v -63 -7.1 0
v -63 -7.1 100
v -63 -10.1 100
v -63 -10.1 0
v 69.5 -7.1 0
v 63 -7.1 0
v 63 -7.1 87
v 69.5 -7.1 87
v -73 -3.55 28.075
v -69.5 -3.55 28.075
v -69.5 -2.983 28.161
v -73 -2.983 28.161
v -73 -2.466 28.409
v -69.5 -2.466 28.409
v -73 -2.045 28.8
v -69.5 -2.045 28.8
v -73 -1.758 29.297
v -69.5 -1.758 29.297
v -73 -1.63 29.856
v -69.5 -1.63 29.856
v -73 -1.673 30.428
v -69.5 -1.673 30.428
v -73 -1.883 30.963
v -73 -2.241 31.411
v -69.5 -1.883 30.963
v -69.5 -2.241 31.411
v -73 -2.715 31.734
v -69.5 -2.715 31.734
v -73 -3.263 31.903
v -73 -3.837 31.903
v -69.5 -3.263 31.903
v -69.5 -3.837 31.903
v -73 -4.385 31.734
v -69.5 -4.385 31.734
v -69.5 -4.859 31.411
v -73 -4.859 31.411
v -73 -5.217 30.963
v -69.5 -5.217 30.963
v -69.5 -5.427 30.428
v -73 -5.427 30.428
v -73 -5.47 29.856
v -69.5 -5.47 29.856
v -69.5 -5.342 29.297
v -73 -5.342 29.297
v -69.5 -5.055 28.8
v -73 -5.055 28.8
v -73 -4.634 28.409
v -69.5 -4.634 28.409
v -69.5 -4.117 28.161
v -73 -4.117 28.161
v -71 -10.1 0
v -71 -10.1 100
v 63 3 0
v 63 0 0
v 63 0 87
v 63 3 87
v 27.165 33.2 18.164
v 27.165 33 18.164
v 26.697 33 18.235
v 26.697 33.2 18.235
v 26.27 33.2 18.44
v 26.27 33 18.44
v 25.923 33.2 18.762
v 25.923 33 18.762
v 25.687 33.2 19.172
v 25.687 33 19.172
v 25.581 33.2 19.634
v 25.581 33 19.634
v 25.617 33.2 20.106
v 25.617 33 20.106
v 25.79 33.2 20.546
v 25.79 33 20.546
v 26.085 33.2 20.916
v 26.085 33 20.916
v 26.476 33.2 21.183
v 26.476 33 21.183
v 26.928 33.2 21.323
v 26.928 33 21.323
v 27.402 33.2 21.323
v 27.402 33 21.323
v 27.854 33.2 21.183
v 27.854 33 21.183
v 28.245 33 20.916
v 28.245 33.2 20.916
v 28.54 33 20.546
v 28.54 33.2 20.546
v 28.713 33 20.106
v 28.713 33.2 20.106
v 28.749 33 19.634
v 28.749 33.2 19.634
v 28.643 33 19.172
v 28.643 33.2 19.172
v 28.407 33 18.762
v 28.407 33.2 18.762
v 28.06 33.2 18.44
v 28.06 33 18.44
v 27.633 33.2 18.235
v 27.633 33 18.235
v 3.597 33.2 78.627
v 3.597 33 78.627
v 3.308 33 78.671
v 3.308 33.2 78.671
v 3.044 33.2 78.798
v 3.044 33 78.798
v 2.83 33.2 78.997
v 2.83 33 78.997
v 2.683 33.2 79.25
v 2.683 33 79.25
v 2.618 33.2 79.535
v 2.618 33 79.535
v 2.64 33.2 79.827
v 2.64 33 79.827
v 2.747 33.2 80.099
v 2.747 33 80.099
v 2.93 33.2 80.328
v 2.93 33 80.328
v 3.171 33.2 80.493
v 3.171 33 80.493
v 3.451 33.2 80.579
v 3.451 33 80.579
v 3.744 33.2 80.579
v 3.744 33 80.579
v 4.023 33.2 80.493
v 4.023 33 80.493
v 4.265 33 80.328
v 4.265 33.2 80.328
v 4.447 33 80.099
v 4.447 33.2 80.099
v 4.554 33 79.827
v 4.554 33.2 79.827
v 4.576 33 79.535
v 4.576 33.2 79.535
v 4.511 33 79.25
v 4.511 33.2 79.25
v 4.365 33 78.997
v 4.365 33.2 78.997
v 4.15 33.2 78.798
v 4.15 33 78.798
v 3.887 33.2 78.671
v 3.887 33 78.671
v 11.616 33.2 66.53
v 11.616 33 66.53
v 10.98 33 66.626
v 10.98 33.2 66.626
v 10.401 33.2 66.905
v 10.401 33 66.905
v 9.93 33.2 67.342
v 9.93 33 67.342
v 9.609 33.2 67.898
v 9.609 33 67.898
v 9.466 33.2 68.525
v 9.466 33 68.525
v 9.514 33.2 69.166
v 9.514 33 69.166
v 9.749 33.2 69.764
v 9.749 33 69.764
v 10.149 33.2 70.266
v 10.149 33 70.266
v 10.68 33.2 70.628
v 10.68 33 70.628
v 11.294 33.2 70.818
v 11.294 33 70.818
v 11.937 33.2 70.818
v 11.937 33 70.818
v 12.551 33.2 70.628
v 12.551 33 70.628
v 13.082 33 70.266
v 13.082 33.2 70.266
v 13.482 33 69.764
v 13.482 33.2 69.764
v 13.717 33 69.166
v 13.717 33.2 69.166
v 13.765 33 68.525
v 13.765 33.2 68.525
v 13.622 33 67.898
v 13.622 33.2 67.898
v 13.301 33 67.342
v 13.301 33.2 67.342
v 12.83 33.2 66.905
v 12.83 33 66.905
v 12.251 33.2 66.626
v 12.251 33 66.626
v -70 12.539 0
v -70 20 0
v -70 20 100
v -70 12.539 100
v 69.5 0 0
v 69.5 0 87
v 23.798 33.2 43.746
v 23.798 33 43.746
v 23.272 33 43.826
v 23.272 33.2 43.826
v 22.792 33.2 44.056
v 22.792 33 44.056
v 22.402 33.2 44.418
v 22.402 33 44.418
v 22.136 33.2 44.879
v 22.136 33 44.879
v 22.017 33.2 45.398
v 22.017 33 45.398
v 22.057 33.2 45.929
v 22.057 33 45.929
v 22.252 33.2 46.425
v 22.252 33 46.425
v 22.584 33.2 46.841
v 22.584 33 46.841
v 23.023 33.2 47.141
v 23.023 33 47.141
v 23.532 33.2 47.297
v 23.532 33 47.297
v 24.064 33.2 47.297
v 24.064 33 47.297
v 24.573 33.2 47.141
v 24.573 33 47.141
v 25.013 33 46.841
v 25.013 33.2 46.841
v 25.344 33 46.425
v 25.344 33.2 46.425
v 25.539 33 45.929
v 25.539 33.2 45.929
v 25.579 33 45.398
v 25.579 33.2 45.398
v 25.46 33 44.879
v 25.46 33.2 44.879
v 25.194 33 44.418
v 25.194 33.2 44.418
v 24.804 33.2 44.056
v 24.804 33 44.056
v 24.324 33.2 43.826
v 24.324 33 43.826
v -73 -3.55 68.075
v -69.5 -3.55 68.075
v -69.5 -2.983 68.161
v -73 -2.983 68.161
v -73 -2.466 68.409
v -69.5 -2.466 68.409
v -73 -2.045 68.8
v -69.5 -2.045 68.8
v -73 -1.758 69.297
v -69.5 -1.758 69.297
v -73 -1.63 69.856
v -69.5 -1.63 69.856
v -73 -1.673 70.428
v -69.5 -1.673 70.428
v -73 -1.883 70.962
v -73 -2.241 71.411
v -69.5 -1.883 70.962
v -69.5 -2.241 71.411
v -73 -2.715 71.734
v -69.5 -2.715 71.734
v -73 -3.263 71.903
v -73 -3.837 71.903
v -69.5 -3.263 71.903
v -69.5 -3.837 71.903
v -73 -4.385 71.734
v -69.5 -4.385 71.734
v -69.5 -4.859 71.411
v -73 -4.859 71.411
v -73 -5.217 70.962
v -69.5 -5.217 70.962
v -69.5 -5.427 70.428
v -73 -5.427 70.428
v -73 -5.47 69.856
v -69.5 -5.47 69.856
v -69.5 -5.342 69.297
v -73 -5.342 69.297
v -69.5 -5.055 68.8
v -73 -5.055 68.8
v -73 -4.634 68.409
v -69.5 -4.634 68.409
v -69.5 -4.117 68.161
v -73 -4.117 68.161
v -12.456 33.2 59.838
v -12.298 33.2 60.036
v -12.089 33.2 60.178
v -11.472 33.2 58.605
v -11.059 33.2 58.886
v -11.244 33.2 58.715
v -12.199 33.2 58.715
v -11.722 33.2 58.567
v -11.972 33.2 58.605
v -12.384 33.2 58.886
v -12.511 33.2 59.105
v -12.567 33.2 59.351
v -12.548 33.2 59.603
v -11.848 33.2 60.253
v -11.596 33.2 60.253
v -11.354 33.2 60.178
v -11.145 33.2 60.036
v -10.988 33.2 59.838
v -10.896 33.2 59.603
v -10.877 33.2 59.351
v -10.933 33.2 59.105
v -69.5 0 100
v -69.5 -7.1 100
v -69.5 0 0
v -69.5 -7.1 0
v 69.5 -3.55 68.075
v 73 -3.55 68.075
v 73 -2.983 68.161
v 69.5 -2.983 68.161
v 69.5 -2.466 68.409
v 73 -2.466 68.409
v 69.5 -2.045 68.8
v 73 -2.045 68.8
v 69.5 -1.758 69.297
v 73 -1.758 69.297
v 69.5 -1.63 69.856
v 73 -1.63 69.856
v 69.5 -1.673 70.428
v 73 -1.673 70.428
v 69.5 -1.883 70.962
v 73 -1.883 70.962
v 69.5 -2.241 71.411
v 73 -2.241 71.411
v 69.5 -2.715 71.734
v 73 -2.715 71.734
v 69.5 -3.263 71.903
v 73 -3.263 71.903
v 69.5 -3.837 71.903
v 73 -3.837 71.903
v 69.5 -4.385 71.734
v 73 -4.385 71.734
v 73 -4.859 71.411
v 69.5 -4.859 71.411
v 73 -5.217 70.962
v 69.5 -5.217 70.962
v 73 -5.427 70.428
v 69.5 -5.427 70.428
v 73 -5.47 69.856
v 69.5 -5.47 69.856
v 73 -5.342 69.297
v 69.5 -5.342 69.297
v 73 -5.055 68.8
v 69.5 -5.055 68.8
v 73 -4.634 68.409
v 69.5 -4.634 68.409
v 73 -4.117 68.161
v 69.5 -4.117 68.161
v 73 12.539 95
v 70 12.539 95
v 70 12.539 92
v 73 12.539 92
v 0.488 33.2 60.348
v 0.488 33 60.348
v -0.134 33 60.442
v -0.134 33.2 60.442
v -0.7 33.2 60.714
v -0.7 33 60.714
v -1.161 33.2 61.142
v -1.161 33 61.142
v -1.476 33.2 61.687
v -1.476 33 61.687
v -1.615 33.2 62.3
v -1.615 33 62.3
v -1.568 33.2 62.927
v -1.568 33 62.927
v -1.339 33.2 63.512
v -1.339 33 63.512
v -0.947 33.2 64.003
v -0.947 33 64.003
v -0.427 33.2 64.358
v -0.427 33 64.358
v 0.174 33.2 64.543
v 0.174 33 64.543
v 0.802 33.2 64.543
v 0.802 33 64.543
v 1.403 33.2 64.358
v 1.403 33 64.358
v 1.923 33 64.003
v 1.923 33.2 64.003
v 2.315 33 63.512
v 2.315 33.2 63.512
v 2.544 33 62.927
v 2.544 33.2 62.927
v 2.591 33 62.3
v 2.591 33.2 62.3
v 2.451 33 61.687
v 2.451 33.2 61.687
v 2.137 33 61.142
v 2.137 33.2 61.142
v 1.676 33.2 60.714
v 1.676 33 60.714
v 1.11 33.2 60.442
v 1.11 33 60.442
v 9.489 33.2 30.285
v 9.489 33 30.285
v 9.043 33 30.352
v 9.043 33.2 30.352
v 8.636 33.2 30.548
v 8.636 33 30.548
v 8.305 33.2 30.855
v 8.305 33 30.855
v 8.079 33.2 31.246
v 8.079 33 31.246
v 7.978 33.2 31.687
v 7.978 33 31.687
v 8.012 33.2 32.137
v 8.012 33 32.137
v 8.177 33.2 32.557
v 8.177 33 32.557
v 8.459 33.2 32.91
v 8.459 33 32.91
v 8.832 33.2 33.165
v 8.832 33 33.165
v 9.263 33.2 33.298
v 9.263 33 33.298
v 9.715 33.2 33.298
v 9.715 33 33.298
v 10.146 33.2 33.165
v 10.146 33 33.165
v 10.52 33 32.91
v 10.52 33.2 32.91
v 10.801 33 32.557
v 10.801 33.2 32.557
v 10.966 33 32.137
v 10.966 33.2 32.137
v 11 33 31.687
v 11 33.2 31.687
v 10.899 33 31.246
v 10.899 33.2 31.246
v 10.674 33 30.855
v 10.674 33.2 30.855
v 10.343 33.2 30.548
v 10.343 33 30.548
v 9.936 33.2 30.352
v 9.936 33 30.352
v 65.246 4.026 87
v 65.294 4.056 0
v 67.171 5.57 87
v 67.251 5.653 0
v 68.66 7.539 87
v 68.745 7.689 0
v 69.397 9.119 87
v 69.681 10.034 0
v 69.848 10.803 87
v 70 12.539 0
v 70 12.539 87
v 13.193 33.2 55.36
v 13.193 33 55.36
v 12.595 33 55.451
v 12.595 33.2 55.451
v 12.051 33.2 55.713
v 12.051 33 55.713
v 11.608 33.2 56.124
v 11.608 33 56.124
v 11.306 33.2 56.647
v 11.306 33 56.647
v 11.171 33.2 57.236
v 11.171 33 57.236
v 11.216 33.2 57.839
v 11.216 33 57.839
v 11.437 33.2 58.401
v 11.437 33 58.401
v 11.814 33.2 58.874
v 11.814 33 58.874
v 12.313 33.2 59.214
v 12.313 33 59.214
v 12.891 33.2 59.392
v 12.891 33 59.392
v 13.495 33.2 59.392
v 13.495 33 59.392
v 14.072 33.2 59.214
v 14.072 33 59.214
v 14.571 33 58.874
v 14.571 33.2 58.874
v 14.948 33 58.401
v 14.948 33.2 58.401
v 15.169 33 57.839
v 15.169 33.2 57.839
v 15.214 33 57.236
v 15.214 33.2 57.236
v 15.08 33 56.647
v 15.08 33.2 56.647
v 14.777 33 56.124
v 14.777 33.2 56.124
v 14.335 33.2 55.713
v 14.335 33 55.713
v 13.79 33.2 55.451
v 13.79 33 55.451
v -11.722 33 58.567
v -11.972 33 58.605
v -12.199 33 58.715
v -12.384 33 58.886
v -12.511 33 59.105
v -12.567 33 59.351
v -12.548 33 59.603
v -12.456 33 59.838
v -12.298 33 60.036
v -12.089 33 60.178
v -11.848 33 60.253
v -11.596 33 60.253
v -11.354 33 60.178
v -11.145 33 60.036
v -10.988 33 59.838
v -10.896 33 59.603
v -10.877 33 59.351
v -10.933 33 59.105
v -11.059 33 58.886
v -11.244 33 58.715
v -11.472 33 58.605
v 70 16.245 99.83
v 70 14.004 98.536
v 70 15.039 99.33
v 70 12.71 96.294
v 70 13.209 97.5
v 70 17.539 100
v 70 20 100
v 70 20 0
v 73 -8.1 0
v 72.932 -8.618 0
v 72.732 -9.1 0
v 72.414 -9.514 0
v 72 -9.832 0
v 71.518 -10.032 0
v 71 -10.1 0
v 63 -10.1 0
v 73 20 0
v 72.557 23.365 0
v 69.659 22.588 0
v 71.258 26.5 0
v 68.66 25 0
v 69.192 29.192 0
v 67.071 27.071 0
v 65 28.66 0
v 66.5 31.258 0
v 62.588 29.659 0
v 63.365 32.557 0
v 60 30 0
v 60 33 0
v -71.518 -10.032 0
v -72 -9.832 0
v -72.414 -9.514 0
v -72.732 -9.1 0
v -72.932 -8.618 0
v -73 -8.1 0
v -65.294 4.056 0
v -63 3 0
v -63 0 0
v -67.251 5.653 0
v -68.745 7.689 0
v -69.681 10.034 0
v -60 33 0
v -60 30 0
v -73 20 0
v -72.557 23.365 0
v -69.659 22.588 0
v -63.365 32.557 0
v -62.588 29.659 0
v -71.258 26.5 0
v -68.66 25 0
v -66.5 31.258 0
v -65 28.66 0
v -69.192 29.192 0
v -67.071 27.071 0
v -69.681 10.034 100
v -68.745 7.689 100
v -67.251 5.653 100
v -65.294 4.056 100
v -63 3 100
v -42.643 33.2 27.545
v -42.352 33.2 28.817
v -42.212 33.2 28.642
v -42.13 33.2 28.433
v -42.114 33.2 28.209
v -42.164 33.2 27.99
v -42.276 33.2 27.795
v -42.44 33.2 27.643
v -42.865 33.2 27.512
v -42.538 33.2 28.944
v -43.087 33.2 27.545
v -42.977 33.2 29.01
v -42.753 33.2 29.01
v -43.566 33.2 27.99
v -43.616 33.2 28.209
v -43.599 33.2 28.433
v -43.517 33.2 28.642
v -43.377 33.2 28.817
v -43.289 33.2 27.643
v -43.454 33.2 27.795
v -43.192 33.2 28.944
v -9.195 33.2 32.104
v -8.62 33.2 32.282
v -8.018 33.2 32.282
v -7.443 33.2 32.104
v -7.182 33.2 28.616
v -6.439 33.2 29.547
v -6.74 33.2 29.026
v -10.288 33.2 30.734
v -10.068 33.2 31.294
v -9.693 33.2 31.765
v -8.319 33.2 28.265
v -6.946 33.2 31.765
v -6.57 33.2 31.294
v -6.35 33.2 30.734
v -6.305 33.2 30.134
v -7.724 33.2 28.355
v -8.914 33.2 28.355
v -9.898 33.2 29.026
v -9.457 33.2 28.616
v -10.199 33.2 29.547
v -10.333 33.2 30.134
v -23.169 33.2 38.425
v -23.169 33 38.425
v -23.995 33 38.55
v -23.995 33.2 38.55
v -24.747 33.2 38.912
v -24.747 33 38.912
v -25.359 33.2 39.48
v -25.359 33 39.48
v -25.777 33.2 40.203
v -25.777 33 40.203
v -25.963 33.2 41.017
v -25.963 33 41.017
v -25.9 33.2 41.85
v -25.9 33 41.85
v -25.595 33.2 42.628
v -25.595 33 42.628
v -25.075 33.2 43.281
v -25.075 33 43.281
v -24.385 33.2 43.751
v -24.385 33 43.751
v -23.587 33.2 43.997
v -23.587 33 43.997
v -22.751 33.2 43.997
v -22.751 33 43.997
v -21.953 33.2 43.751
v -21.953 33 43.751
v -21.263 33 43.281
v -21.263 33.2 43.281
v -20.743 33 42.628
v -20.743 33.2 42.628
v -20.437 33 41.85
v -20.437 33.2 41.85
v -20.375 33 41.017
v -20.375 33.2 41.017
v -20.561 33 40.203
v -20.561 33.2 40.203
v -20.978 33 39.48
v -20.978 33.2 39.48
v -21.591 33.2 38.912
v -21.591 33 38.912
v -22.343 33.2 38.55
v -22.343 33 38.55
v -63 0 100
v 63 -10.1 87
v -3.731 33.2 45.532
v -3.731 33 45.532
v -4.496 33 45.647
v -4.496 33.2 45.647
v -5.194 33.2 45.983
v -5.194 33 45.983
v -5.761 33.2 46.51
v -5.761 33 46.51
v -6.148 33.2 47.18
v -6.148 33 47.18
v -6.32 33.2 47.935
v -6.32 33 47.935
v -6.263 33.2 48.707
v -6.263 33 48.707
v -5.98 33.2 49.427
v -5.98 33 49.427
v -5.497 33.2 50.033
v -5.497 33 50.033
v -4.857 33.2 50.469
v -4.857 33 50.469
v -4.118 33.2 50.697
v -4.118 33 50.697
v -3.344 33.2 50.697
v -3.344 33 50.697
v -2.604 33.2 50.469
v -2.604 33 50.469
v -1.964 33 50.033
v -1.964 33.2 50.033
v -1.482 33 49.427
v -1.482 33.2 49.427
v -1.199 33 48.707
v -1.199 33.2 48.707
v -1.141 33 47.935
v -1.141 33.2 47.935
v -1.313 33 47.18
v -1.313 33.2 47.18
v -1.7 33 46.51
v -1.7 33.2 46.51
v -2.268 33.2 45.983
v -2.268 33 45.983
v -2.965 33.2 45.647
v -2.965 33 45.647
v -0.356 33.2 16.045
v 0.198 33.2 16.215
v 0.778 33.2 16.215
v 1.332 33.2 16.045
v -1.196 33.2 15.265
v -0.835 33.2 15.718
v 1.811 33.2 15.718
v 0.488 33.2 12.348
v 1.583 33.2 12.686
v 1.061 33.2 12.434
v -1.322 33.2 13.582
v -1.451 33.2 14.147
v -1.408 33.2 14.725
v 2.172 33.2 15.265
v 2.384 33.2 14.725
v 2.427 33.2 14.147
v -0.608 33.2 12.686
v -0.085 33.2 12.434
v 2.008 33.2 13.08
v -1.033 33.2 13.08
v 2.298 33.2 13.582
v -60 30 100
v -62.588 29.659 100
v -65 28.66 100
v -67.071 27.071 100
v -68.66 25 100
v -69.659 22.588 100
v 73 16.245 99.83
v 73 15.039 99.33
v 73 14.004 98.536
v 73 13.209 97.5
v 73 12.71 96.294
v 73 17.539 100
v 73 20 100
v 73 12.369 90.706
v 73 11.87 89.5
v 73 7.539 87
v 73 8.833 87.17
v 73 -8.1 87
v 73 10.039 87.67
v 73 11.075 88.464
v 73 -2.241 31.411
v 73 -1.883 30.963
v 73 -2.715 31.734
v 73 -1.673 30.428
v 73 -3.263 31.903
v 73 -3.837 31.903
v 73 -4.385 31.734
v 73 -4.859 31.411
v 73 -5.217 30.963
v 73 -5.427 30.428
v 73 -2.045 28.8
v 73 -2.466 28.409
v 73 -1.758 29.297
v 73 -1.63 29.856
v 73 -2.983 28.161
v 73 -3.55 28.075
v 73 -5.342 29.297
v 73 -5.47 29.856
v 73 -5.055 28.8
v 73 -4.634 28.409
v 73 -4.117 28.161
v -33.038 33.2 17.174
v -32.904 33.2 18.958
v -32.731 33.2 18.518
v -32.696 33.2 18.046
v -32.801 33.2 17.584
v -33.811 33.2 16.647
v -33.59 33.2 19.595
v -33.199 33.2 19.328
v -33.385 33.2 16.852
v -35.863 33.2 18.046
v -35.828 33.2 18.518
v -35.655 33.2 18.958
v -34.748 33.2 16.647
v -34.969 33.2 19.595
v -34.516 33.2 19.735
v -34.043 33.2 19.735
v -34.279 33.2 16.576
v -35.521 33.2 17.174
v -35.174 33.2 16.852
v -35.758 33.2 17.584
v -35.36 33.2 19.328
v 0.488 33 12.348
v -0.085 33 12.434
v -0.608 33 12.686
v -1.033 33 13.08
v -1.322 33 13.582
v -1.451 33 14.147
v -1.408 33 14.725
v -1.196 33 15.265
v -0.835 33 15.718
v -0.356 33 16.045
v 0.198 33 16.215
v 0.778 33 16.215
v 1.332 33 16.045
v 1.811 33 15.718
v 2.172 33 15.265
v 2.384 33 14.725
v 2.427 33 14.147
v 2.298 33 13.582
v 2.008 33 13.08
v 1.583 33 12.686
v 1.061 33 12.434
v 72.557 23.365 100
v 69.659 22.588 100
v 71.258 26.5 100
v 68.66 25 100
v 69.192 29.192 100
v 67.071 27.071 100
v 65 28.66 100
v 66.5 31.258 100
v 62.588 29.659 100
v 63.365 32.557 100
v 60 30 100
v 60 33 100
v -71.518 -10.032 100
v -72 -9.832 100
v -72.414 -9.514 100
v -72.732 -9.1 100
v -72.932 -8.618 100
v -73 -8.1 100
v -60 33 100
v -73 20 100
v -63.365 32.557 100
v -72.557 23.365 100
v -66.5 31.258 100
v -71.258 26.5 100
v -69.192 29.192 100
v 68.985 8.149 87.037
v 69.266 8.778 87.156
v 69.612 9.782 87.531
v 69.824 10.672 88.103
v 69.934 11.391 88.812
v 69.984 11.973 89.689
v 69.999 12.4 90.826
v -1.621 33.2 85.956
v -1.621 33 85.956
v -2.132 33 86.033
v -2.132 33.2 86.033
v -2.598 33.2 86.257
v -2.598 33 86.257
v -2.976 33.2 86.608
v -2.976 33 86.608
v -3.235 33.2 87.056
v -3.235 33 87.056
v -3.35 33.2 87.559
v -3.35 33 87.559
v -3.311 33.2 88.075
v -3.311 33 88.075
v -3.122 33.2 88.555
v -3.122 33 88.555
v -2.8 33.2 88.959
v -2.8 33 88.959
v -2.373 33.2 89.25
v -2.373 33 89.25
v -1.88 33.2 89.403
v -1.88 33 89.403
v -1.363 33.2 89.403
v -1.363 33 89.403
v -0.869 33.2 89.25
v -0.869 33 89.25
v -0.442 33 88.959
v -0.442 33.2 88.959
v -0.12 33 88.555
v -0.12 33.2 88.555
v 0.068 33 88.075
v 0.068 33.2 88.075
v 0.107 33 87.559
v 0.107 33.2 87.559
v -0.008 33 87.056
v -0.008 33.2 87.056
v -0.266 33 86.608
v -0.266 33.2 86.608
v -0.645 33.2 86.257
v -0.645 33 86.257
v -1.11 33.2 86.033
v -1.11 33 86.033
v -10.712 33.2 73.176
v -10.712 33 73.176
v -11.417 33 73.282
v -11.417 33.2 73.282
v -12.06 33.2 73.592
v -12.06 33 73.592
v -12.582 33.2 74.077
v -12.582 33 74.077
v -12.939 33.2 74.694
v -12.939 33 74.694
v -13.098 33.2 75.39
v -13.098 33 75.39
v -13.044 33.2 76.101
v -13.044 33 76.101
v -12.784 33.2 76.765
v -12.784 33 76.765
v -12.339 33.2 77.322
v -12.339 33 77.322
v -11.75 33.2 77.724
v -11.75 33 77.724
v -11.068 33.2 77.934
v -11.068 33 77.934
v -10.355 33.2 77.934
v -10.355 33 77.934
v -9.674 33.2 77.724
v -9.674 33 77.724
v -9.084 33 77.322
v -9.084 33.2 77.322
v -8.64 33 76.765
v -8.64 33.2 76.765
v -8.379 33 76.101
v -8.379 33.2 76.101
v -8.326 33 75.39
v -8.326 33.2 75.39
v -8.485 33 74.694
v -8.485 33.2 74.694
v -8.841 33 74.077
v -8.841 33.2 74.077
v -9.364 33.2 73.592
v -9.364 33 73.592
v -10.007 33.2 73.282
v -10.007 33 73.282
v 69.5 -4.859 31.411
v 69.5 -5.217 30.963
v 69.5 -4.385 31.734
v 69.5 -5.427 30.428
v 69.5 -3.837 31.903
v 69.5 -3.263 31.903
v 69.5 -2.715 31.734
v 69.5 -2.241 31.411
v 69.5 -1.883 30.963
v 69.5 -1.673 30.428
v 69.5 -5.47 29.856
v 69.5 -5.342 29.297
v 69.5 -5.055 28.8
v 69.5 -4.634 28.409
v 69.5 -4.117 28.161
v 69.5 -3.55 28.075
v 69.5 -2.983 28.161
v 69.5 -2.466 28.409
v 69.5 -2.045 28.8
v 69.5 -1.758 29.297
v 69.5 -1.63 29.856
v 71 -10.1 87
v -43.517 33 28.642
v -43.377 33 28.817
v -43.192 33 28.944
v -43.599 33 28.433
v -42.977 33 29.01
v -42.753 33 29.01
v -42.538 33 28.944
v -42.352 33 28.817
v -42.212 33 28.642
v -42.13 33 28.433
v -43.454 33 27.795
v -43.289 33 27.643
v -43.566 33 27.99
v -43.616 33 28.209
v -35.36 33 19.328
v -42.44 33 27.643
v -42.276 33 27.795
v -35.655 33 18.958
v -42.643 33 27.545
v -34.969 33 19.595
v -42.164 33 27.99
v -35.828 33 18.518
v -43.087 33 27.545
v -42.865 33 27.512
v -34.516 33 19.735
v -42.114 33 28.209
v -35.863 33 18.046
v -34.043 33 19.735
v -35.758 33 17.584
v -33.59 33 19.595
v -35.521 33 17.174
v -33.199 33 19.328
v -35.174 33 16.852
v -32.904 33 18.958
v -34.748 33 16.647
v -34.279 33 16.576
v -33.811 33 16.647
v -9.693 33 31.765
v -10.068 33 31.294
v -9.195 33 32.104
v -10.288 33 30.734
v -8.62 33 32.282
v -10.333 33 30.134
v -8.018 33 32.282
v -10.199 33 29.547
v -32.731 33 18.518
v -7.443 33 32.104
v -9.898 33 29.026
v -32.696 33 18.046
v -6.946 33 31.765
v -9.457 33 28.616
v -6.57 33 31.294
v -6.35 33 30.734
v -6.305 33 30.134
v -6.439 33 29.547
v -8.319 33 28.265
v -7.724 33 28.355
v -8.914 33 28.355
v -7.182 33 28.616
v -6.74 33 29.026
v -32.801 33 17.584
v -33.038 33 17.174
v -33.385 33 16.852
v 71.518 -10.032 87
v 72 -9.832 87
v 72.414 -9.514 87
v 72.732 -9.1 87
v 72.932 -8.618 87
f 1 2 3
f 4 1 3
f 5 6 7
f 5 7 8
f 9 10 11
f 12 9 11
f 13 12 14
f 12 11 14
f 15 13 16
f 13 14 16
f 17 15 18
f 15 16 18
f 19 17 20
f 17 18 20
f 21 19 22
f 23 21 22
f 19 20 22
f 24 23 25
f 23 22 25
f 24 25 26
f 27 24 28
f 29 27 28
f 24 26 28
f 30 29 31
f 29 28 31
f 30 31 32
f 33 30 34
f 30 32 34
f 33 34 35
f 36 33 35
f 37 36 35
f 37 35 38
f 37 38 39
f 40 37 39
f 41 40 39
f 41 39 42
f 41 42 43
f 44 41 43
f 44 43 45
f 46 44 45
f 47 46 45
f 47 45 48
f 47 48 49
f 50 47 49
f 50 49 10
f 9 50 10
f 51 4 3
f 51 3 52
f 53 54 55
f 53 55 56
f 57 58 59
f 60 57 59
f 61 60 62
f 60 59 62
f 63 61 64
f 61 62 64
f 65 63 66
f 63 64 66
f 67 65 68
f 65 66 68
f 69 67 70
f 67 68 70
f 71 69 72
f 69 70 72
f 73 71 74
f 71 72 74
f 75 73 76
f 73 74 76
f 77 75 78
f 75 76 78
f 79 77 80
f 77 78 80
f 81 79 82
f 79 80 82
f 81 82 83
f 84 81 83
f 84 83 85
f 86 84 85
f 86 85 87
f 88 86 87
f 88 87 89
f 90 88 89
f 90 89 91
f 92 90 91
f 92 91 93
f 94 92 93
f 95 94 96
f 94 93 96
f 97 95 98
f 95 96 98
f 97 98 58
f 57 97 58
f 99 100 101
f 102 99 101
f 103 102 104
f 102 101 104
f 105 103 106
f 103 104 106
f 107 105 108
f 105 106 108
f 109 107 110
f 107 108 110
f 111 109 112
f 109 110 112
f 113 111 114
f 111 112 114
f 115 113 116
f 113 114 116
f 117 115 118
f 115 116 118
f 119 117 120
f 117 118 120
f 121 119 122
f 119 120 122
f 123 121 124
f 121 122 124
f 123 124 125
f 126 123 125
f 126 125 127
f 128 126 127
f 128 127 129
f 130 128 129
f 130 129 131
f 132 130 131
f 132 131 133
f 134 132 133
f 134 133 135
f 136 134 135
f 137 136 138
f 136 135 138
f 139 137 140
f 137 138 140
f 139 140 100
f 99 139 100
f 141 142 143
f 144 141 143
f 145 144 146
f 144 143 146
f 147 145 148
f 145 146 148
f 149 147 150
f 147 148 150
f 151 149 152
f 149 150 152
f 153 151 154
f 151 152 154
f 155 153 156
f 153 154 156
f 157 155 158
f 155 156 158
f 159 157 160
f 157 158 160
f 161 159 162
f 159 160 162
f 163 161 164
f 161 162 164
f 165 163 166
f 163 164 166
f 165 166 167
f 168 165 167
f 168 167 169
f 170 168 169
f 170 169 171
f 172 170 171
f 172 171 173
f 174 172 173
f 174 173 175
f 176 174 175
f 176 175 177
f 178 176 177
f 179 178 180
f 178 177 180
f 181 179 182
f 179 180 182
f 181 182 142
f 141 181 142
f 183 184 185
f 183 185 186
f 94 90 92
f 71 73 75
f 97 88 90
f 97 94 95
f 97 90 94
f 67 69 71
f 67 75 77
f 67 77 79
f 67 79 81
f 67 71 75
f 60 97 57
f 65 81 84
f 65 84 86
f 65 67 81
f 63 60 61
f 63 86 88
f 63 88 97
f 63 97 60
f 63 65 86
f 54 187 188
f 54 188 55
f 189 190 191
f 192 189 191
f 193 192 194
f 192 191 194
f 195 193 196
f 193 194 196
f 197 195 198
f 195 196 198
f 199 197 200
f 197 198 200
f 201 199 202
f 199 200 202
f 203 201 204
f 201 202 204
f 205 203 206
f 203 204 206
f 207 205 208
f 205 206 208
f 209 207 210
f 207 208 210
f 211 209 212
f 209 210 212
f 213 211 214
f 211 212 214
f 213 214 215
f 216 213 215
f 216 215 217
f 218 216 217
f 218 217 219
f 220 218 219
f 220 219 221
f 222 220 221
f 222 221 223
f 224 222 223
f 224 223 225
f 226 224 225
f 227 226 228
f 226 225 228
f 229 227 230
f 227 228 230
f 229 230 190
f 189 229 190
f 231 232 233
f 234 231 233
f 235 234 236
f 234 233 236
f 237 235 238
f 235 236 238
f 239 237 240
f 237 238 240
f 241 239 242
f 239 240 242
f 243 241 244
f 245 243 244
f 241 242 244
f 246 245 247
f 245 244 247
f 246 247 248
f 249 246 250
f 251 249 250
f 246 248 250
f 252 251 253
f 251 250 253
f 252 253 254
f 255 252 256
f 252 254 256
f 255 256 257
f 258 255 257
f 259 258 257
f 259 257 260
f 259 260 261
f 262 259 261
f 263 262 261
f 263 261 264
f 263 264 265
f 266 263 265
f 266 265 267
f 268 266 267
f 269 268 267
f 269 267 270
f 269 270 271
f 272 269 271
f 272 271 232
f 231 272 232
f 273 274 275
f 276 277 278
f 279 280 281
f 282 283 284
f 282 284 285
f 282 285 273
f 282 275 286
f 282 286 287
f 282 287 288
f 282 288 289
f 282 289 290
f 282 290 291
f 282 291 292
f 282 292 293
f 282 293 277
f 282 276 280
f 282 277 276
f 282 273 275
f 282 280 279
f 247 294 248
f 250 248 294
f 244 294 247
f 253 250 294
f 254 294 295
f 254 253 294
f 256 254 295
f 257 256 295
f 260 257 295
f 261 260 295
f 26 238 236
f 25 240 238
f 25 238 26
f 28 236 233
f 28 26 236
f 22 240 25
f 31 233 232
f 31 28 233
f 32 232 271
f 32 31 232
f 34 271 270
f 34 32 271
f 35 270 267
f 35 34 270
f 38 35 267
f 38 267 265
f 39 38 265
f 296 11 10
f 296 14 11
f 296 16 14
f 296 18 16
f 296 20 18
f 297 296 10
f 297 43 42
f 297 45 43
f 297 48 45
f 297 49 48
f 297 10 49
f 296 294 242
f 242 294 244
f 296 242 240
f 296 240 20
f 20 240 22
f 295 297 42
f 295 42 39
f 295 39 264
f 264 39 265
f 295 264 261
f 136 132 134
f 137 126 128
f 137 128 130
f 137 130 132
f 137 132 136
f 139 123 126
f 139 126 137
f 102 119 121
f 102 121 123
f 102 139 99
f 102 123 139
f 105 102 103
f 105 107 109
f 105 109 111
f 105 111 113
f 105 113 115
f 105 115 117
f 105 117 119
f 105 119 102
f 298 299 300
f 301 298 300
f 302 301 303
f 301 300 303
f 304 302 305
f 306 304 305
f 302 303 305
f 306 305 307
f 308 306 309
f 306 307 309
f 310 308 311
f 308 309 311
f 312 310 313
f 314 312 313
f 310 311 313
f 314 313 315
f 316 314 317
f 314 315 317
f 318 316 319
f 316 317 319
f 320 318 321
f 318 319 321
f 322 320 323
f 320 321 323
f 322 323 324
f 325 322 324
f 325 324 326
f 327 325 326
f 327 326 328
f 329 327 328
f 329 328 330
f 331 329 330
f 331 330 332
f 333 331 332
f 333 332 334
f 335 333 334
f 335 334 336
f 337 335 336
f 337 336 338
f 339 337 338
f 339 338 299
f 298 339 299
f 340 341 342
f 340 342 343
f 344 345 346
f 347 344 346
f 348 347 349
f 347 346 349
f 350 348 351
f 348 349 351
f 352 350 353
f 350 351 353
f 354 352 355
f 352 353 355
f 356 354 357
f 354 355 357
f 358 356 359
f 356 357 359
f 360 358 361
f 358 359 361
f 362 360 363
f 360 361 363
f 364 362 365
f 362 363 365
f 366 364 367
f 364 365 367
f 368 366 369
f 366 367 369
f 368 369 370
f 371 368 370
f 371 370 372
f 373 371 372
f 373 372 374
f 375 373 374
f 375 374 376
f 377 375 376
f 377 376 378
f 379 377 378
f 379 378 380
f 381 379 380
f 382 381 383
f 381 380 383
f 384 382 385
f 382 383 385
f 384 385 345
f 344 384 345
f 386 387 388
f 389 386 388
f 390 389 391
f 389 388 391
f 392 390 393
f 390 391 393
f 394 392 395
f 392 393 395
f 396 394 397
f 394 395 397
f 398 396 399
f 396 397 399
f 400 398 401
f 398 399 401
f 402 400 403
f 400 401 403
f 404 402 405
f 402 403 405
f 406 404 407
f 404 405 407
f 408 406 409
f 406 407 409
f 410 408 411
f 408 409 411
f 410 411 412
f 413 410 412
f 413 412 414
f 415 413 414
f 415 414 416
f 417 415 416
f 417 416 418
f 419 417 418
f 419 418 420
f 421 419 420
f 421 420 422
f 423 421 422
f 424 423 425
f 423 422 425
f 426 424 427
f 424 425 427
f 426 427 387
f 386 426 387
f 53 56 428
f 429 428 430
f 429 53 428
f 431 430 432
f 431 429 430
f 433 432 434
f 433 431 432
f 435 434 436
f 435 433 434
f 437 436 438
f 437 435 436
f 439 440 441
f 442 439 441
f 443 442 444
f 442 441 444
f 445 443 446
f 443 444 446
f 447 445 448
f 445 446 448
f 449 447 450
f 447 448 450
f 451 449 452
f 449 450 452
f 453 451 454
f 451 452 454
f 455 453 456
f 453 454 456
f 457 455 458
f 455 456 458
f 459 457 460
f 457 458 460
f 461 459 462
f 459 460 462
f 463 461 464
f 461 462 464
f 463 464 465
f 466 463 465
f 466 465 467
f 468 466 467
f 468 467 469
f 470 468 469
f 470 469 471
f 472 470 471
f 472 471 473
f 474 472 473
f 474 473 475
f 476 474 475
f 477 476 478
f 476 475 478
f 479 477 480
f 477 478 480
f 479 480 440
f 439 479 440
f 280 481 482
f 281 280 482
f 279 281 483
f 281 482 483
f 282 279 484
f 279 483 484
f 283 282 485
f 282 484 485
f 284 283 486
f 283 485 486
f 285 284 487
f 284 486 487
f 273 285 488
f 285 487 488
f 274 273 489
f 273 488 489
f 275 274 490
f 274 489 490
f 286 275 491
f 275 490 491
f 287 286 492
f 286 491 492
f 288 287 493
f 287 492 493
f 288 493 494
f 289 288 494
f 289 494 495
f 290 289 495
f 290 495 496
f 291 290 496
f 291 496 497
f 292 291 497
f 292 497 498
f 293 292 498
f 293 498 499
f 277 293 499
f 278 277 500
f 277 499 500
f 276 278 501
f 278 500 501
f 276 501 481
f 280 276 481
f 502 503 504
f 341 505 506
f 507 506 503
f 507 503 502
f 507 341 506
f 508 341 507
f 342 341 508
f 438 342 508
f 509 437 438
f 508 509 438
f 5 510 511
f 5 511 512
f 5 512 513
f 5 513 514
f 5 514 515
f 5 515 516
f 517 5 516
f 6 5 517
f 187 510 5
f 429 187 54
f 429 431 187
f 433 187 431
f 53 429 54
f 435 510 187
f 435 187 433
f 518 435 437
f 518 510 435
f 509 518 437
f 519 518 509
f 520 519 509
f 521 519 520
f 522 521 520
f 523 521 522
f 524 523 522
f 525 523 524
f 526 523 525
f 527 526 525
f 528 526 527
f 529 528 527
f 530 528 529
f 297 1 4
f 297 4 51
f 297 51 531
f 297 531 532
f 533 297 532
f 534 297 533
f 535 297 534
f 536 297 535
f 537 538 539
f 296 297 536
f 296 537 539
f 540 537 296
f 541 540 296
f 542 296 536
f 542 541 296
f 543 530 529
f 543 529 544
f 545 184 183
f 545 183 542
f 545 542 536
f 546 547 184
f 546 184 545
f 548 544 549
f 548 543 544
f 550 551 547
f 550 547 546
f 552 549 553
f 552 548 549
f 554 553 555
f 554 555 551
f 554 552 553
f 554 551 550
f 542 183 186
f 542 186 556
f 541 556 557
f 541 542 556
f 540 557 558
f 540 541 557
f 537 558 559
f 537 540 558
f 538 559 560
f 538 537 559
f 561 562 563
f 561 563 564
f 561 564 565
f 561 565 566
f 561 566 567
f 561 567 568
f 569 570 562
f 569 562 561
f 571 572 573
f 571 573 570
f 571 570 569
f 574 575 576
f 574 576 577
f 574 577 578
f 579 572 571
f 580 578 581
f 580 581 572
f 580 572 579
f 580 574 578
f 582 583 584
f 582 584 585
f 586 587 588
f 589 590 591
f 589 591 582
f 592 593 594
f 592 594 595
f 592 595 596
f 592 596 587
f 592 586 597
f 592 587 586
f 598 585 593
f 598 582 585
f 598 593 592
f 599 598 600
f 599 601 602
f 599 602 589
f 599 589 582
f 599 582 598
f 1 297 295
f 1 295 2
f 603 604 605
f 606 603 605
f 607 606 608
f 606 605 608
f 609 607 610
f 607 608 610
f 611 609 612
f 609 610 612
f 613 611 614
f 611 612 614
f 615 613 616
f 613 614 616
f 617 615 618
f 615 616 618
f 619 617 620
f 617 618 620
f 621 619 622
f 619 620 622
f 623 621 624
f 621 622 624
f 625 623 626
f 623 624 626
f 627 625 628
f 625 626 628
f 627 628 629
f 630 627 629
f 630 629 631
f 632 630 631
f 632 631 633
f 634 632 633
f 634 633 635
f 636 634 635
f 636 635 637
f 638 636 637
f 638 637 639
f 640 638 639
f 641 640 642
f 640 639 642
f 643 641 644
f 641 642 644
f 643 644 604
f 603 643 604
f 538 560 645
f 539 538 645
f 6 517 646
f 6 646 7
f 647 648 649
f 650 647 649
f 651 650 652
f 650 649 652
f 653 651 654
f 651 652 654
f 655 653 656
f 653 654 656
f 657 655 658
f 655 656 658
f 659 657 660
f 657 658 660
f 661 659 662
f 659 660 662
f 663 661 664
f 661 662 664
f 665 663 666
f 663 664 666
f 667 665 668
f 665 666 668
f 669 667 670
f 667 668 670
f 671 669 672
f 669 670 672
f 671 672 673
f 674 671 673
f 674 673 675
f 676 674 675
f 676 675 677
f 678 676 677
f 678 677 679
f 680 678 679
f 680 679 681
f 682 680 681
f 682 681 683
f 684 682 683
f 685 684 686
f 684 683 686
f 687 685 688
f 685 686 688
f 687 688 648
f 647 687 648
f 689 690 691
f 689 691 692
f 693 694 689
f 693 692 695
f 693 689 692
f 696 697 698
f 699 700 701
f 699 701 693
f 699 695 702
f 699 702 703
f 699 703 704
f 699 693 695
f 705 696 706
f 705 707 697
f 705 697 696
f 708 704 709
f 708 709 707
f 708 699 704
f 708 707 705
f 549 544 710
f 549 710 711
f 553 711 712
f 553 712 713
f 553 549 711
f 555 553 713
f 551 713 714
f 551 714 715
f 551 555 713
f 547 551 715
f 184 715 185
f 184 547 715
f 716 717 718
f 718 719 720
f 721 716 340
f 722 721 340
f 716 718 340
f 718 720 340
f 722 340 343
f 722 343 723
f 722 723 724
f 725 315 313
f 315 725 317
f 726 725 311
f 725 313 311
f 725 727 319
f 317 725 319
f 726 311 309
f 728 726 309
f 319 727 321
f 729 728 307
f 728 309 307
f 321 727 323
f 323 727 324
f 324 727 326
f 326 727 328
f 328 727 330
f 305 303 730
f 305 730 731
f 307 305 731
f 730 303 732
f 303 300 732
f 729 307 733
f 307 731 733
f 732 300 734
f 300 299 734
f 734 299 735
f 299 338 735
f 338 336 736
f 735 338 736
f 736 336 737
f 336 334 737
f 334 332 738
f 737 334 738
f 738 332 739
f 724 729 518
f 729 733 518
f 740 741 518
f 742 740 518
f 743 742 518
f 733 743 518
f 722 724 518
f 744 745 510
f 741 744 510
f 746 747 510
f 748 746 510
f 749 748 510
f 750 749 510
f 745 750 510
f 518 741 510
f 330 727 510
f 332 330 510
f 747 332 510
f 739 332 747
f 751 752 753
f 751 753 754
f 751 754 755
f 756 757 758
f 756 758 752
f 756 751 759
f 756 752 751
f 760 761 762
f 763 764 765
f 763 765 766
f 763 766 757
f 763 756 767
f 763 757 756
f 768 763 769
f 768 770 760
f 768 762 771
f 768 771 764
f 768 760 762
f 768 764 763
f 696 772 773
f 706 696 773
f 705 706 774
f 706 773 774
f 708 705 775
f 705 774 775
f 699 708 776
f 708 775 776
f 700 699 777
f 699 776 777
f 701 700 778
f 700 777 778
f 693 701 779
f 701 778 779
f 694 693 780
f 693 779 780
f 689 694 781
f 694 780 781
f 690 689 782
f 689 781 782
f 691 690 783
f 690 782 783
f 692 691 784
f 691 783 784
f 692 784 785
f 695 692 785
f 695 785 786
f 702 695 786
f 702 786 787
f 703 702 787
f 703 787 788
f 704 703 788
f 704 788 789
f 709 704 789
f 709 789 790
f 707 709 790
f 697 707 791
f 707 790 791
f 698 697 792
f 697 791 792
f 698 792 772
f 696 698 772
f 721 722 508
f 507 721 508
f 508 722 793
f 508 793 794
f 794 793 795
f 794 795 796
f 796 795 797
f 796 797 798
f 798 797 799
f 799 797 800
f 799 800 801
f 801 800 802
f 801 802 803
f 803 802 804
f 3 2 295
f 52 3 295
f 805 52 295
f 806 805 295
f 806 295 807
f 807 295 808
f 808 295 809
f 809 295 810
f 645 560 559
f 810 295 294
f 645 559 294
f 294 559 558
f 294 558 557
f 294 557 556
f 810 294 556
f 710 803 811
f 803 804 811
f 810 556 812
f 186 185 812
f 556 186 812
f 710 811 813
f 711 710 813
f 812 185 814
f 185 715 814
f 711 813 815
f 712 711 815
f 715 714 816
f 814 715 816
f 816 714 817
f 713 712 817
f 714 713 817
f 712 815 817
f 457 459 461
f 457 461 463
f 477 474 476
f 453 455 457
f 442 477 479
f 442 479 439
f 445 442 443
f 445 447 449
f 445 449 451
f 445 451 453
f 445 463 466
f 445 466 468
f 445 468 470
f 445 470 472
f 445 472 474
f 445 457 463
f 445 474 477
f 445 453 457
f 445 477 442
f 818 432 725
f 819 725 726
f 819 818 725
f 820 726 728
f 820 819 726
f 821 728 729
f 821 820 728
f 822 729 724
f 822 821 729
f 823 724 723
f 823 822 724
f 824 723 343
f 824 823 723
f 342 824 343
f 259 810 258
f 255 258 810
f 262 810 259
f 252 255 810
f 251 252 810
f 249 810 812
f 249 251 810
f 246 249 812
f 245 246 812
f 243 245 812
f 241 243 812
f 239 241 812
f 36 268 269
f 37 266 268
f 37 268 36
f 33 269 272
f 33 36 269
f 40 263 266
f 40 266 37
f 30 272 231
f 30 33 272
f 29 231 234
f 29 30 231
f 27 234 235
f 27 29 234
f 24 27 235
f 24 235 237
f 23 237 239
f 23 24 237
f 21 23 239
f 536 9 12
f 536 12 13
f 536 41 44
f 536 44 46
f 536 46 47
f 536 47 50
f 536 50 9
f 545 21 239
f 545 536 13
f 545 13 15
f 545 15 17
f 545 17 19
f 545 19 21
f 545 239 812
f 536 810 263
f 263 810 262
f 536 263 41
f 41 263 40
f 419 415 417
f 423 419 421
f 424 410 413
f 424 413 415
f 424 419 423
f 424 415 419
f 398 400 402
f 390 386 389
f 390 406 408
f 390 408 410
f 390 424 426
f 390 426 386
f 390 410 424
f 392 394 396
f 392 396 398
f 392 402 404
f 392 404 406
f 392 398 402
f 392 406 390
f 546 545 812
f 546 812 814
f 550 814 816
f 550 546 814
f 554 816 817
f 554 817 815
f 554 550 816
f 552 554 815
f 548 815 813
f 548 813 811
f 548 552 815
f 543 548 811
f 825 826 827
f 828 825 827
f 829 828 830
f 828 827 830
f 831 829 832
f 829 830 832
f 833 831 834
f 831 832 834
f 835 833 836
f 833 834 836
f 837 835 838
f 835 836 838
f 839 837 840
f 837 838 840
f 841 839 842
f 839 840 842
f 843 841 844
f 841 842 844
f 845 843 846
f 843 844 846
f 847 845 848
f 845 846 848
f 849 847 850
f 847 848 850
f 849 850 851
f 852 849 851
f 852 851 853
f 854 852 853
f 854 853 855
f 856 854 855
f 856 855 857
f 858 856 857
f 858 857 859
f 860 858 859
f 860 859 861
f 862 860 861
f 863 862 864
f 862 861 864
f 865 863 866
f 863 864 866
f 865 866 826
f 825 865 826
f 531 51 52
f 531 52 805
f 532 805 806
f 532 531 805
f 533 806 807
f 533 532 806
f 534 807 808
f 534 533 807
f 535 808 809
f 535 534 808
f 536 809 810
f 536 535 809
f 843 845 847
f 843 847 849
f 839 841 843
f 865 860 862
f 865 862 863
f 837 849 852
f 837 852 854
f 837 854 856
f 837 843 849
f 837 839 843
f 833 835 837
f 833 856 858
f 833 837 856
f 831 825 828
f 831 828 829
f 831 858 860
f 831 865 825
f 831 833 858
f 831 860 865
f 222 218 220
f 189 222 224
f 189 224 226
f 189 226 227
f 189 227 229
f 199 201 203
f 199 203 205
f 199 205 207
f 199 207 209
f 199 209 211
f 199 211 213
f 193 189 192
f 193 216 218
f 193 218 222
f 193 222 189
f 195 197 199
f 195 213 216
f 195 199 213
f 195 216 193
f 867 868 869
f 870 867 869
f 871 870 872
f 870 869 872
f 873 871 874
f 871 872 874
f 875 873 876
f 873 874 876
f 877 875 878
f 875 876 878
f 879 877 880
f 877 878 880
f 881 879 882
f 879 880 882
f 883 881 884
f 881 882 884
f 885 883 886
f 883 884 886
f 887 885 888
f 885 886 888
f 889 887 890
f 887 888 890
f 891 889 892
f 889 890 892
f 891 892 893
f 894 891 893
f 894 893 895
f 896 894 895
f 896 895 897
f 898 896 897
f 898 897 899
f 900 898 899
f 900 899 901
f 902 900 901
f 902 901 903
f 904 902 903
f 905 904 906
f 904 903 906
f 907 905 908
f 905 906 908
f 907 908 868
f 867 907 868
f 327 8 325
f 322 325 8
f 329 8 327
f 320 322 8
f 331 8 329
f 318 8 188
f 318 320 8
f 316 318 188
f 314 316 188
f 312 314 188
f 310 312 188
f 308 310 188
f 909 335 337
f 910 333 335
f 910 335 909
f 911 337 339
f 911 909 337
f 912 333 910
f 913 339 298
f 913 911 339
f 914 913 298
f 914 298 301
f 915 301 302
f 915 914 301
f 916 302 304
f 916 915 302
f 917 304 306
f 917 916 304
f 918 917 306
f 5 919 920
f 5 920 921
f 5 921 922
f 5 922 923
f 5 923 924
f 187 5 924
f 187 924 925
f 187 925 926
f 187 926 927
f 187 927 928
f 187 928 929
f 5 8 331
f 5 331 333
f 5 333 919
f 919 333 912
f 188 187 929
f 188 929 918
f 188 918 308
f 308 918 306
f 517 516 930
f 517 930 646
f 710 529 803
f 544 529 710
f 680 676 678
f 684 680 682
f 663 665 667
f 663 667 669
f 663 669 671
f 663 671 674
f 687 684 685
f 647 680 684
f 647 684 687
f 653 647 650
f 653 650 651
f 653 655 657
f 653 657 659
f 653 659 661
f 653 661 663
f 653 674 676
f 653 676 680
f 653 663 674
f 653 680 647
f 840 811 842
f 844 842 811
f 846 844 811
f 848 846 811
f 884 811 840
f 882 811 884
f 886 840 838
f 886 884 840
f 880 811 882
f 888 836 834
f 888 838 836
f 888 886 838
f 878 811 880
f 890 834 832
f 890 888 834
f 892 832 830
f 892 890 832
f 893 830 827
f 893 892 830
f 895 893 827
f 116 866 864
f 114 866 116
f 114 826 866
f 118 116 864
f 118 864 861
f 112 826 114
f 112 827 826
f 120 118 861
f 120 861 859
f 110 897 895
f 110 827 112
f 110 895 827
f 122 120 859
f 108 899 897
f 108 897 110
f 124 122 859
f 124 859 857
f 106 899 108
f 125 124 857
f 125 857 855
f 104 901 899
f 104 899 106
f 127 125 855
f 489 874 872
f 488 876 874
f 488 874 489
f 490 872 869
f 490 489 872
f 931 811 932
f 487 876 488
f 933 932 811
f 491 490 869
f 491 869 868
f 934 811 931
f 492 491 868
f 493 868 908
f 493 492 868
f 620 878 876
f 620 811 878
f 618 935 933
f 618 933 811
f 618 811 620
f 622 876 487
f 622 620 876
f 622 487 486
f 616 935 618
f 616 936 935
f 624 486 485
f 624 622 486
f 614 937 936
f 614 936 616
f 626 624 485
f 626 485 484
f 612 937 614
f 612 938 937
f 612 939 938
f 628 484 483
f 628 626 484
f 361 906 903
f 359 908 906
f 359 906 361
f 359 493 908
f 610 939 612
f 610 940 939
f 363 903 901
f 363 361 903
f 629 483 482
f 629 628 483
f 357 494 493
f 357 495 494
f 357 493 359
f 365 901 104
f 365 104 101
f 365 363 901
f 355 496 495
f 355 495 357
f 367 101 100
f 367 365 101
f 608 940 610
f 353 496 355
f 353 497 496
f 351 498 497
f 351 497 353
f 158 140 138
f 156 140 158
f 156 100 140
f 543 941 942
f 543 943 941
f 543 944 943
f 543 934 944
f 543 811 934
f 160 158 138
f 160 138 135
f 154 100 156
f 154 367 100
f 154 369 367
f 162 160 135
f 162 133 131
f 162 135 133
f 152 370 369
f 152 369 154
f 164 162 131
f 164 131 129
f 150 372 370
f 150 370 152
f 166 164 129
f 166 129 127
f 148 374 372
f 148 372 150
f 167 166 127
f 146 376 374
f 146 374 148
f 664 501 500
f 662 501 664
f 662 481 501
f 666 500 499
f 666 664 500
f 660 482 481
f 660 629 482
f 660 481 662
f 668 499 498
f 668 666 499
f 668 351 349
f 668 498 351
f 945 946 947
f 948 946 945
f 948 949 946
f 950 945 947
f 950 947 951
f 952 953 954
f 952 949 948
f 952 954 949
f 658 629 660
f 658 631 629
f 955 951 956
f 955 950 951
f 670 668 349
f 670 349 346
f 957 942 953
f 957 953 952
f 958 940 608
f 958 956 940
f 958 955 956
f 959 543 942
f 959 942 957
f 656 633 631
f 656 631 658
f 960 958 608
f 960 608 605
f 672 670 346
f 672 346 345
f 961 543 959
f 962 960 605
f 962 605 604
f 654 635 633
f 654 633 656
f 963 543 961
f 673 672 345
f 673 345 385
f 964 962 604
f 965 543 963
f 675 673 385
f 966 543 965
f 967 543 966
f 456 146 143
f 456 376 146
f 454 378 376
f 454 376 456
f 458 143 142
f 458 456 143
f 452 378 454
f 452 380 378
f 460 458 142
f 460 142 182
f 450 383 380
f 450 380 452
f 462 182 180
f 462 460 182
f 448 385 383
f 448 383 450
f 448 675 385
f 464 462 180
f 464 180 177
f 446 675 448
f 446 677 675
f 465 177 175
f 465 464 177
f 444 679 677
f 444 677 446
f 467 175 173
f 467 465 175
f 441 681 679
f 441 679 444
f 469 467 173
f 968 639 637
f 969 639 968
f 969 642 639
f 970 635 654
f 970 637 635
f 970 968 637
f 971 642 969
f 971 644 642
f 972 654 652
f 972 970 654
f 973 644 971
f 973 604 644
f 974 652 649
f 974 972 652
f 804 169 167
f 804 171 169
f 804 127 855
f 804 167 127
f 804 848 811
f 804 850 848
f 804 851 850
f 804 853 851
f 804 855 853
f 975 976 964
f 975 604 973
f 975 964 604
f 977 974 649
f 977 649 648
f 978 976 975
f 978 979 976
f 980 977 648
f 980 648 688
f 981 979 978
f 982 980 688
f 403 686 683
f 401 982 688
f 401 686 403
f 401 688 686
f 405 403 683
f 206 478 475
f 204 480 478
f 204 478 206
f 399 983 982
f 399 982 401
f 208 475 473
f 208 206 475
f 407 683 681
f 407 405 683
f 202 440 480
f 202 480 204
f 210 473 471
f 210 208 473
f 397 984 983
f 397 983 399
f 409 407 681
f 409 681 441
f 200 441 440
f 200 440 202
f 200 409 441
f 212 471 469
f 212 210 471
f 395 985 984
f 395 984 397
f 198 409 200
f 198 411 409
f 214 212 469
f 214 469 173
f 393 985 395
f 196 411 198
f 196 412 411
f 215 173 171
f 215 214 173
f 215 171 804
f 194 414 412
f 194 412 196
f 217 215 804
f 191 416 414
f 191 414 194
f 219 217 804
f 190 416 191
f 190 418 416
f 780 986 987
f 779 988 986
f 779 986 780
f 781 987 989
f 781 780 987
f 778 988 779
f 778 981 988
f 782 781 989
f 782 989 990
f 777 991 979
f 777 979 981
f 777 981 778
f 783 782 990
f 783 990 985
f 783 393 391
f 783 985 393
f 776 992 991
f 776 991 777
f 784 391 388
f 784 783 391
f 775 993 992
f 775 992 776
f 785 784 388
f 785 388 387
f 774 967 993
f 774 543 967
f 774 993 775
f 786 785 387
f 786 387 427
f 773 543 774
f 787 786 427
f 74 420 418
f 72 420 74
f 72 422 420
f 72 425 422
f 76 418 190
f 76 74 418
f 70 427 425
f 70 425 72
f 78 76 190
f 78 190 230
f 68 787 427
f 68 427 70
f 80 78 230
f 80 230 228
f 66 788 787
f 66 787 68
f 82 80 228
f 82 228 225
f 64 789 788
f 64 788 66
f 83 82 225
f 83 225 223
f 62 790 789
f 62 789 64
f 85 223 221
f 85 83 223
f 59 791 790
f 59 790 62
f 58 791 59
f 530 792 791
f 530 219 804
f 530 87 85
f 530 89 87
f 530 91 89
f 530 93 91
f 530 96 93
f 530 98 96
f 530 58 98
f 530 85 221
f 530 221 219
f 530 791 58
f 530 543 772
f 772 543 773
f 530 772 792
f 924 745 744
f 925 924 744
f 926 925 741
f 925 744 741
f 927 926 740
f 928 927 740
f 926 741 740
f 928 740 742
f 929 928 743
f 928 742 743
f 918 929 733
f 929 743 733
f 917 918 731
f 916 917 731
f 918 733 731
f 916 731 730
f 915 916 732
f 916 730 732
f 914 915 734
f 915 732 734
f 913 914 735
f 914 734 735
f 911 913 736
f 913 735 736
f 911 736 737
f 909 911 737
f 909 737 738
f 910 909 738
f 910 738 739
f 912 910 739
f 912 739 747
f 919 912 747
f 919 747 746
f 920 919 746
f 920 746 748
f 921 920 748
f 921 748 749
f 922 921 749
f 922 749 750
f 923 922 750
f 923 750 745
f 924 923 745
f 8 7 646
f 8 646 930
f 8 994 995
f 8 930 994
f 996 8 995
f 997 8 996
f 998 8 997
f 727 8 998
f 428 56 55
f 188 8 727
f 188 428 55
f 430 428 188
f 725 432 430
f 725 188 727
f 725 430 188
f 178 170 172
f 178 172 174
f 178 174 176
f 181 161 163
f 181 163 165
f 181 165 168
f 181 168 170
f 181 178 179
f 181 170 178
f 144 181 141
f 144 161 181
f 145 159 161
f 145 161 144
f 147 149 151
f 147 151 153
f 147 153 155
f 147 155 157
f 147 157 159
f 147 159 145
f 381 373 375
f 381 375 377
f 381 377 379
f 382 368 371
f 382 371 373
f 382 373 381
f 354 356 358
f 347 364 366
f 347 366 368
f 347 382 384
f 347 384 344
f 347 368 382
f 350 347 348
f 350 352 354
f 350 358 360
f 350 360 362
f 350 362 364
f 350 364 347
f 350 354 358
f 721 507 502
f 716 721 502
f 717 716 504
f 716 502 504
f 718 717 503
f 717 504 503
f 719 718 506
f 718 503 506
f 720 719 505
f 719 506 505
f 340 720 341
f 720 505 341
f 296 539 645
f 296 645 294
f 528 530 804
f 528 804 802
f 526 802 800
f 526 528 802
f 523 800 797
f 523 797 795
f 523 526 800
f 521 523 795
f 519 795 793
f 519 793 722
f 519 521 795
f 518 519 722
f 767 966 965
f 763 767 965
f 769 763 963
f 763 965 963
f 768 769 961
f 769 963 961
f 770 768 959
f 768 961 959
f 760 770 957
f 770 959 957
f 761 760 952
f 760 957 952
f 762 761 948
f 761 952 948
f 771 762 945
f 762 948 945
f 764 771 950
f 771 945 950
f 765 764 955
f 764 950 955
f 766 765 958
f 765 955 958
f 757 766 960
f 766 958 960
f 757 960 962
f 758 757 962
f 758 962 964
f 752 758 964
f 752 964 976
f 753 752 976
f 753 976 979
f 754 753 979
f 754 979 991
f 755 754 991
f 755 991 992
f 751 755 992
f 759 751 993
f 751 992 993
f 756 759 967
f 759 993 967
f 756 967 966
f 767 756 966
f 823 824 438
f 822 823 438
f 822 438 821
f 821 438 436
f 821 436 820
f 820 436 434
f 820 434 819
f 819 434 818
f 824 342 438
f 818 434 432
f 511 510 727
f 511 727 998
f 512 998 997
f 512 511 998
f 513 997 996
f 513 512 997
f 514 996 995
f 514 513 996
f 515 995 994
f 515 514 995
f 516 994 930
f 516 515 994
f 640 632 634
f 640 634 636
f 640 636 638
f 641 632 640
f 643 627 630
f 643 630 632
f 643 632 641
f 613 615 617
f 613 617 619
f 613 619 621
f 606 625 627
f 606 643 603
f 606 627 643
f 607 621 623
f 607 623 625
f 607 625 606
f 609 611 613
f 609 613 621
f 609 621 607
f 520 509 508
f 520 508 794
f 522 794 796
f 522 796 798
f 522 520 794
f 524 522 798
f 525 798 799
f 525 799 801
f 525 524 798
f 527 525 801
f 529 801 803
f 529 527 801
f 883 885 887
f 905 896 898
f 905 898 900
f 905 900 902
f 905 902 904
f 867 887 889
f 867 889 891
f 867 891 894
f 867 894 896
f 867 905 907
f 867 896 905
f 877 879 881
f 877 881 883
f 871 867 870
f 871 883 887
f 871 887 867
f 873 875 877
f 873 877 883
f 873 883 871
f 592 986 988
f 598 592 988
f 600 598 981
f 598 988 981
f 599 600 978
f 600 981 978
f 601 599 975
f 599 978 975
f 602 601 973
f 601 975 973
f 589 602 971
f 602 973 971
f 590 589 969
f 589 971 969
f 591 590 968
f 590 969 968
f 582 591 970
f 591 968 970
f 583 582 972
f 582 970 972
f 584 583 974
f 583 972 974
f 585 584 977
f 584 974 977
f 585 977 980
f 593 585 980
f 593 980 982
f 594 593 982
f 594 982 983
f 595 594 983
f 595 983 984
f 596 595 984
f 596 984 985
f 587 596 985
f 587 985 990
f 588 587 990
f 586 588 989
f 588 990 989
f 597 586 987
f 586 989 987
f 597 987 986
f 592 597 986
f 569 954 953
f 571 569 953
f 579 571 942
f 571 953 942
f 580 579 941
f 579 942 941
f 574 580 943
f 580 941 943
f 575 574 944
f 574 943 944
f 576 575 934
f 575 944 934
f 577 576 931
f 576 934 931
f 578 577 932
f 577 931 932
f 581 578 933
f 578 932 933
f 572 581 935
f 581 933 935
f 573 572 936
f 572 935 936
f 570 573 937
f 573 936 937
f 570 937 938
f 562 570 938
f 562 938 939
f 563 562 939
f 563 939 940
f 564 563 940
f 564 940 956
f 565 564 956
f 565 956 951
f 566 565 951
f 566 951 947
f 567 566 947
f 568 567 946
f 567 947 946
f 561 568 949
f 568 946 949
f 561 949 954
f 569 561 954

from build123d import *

# Parameters (mm, degrees)
BOSS_EXTRUDE1_DEPTH = 100
SKETCH2_R           = 1.925
CUT_EXTRUDE1_DEPTH  = 181.013888353
SKETCH3_W           = 10
SKETCH3_H           = 22.639392014
CUT_EXTRUDE2_DEPTH  = 13
FILLET1_R           = 5
SKETCH4_R           = 1.733173836
SKETCH4_R_2         = 0.981586666
SKETCH4_R_3         = 2.392571232
SKETCH4_R_4         = 2.109303231
SKETCH4_R_5         = 2.027090755
SKETCH4_R_6         = 2.155813145
SKETCH4_R_7         = 2.801748037
SKETCH4_R_8         = 1.588123218
SKETCH4_R_9         = 1.944759062
SKETCH4_R_10        = 2.597034209
SKETCH4_R_11        = 0.847315687
SKETCH4_R_12        = 1.785604619
SKETCH4_R_13        = 1.51506652
SKETCH4_R_14        = 2.019517128
SKETCH4_R_15        = 0.753353873
BOSS_EXTRUDE2_DEPTH = 0.2


with BuildPart() as part:
    # Sketch1 → Boss-Extrude1 (new body)
    with BuildSketch(Plane.XY):
        with BuildLine():
            Line((-63, -7.1), (-63, -10.1))
            Line((-63, -10.1), (-71, -10.1))
            ThreePointArc((-71, -10.1), (-72.414213562, -9.514213562), (-73, -8.1))
            Line((-73, -8.1), (-73, 20))
            ThreePointArc((-73, 20), (-69.192388155, 29.192388155), (-60, 33))
            Line((-60, 33), (60, 33))
            ThreePointArc((60, 33), (69.192388155, 29.192388155), (73, 20))
            Line((73, 20), (73, -8.1))
            ThreePointArc((73, -8.1), (72.414213562, -9.514213562), (71, -10.1))
            Line((71, -10.1), (63, -10.1))
            Line((63, -10.1), (63, -7.1))
            Line((63, -7.1), (69.5, -7.1))
            Line((69.5, -7.1), (69.5, 0))
            Line((69.5, 0), (63, 0))
            Line((63, 0), (63, 3))
            ThreePointArc((63, 3), (68.062257748, 6.623312231), (70, 12.539392014))
            Line((70, 12.539392014), (70, 20))
            ThreePointArc((70, 20), (67.071067812, 27.071067812), (60, 30))
            Line((60, 30), (-60, 30))
            ThreePointArc((-60, 30), (-67.071067812, 27.071067812), (-70, 20))
            Line((-70, 20), (-70, 12.539392014))
            ThreePointArc((-70, 12.539392014), (-68.062257748, 6.623312231), (-63, 3))
            Line((-63, 3), (-63, 0))
            Line((-63, 0), (-69.5, 0))
            Line((-69.5, 0), (-69.5, -7.1))
            Line((-69.5, -7.1), (-63, -7.1))
        make_face()
    extrude(amount=BOSS_EXTRUDE1_DEPTH)

    # Sketch2 → Cut-Extrude1 (cut, through all)
    with BuildSketch(Plane(origin=(73, 0, 0), x_dir=(0, 0, -1), z_dir=(1, 0, 0))):
        with Locations((-70, -3.55)):
            Circle(SKETCH2_R)
        with Locations((-30, -3.55)):
            Circle(SKETCH2_R)
    extrude(amount=-CUT_EXTRUDE1_DEPTH, mode=Mode.SUBTRACT)

    # Sketch3 → Cut-Extrude2 (cut)
    with BuildSketch(Plane.XY.offset(100)):
        with Locations((68, 1.219696007)):
            Rectangle(SKETCH3_W, SKETCH3_H)
    extrude(amount=-CUT_EXTRUDE2_DEPTH, mode=Mode.SUBTRACT)

    # Fillet1
    # the kernel refuses this fillet: 5 mm, written as the material it adds along each edge
    with BuildSketch(Plane(origin=(57.5, 12.539392014, 87), x_dir=(0, 0, 1), z_dir=(1, 0, 0))) as fillet1_piece_1_section:
        with BuildLine():
            CenterArc((FILLET1_R, FILLET1_R), FILLET1_R, 180, 90)
            Line((0, FILLET1_R), (0, 0))
            Line((0, 0), (FILLET1_R, 0))
        make_face()
    fillet1_piece_1 = extrude(amount=15.5, mode=Mode.PRIVATE)
    fillet1_piece_1 = fillet1_piece_1 - Plane(origin=(60, 12.539392014, 87.300010579), x_dir=(0.30000000000000276, -0.9539392014169449, 0), z_dir=(0, 0, -1)) * Cylinder(10, 52, mode=Mode.PRIVATE)
    add(fillet1_piece_1)
    # the kernel refuses this fillet: 5 mm, written as the material it takes off along each edge
    with BuildSketch(Plane(origin=(57.5, 12.539392014, 100), x_dir=(0, 1, 0), z_dir=(1, 0, 0))) as fillet1_2_piece_1:
        with BuildLine():
            CenterArc((FILLET1_R, -FILLET1_R), FILLET1_R, 90, 90)
            Line((0, -FILLET1_R), (0, 0))
            Line((0, 0), (FILLET1_R, 0))
        make_face()
    extrude(amount=28, mode=Mode.SUBTRACT)

    # Sketch4 → Boss-Extrude2 (add)
    with BuildSketch(Plane(origin=(0, 33, 0), x_dir=(1, 0, 0), z_dir=(0, 1, 0))):
        with Locations(Location((-1.621353912, -87.688909541, 0), (0, 0, 90))):
            Circle(SKETCH4_R)
        with Locations(Location((3.597208545, -79.608554769, 0), (0, 0, 90))):
            Circle(SKETCH4_R_2)
        with Locations(Location((-10.711753031, -75.568377383, 0), (0, 0, 90))):
            Circle(SKETCH4_R_3)
        with Locations(Location((0.487949319, -62.457213607, 0), (0, 0, 90))):
            Circle(SKETCH4_R_4)
        with Locations(Location((13.192629836, -57.387579146, 0), (0, 0, 90))):
            Circle(SKETCH4_R_5)
        with Locations(Location((11.615509985, -68.68582041, 0), (0, 0, 90))):
            Circle(SKETCH4_R_6)
        with Locations(Location((-23.168966637, -41.226869603, 0), (0, 0, 90))):
            Circle(SKETCH4_R_7)
        with Locations(Location((-34.279454449, -18.164190358, 0), (0, 0, 90))):
            Circle(SKETCH4_R_8)
        with Locations(Location((0.487949319, -14.292353696, 0), (0, 0, 90))):
            Circle(SKETCH4_R_9)
        with Locations(Location((27.164909963, -19.752313576, 0), (0, 0, 90))):
            Circle(SKETCH4_R_8)
        with Locations(Location((-3.730657143, -48.128839304, 0), (0, 0, 90))):
            Circle(SKETCH4_R_10)
        with Locations(Location((-11.721797377, -59.414669901, 0), (0, 0, 90))):
            Circle(SKETCH4_R_11)
        with Locations(Location((23.798095474, -45.531805095, 0), (0, 0, 90))):
            Circle(SKETCH4_R_12)
        with Locations(Location((9.489133899, -31.799789035, 0), (0, 0, 90))):
            Circle(SKETCH4_R_13)
        with Locations(Location((-8.319181799, -30.284722516, 0), (0, 0, 90))):
            Circle(SKETCH4_R_14)
        with Locations(Location((-42.864831394, -28.265205387, 0), (0, 0, 90))):
            Circle(SKETCH4_R_15)
    extrude(amount=BOSS_EXTRUDE2_DEPTH)


solid = part.part
